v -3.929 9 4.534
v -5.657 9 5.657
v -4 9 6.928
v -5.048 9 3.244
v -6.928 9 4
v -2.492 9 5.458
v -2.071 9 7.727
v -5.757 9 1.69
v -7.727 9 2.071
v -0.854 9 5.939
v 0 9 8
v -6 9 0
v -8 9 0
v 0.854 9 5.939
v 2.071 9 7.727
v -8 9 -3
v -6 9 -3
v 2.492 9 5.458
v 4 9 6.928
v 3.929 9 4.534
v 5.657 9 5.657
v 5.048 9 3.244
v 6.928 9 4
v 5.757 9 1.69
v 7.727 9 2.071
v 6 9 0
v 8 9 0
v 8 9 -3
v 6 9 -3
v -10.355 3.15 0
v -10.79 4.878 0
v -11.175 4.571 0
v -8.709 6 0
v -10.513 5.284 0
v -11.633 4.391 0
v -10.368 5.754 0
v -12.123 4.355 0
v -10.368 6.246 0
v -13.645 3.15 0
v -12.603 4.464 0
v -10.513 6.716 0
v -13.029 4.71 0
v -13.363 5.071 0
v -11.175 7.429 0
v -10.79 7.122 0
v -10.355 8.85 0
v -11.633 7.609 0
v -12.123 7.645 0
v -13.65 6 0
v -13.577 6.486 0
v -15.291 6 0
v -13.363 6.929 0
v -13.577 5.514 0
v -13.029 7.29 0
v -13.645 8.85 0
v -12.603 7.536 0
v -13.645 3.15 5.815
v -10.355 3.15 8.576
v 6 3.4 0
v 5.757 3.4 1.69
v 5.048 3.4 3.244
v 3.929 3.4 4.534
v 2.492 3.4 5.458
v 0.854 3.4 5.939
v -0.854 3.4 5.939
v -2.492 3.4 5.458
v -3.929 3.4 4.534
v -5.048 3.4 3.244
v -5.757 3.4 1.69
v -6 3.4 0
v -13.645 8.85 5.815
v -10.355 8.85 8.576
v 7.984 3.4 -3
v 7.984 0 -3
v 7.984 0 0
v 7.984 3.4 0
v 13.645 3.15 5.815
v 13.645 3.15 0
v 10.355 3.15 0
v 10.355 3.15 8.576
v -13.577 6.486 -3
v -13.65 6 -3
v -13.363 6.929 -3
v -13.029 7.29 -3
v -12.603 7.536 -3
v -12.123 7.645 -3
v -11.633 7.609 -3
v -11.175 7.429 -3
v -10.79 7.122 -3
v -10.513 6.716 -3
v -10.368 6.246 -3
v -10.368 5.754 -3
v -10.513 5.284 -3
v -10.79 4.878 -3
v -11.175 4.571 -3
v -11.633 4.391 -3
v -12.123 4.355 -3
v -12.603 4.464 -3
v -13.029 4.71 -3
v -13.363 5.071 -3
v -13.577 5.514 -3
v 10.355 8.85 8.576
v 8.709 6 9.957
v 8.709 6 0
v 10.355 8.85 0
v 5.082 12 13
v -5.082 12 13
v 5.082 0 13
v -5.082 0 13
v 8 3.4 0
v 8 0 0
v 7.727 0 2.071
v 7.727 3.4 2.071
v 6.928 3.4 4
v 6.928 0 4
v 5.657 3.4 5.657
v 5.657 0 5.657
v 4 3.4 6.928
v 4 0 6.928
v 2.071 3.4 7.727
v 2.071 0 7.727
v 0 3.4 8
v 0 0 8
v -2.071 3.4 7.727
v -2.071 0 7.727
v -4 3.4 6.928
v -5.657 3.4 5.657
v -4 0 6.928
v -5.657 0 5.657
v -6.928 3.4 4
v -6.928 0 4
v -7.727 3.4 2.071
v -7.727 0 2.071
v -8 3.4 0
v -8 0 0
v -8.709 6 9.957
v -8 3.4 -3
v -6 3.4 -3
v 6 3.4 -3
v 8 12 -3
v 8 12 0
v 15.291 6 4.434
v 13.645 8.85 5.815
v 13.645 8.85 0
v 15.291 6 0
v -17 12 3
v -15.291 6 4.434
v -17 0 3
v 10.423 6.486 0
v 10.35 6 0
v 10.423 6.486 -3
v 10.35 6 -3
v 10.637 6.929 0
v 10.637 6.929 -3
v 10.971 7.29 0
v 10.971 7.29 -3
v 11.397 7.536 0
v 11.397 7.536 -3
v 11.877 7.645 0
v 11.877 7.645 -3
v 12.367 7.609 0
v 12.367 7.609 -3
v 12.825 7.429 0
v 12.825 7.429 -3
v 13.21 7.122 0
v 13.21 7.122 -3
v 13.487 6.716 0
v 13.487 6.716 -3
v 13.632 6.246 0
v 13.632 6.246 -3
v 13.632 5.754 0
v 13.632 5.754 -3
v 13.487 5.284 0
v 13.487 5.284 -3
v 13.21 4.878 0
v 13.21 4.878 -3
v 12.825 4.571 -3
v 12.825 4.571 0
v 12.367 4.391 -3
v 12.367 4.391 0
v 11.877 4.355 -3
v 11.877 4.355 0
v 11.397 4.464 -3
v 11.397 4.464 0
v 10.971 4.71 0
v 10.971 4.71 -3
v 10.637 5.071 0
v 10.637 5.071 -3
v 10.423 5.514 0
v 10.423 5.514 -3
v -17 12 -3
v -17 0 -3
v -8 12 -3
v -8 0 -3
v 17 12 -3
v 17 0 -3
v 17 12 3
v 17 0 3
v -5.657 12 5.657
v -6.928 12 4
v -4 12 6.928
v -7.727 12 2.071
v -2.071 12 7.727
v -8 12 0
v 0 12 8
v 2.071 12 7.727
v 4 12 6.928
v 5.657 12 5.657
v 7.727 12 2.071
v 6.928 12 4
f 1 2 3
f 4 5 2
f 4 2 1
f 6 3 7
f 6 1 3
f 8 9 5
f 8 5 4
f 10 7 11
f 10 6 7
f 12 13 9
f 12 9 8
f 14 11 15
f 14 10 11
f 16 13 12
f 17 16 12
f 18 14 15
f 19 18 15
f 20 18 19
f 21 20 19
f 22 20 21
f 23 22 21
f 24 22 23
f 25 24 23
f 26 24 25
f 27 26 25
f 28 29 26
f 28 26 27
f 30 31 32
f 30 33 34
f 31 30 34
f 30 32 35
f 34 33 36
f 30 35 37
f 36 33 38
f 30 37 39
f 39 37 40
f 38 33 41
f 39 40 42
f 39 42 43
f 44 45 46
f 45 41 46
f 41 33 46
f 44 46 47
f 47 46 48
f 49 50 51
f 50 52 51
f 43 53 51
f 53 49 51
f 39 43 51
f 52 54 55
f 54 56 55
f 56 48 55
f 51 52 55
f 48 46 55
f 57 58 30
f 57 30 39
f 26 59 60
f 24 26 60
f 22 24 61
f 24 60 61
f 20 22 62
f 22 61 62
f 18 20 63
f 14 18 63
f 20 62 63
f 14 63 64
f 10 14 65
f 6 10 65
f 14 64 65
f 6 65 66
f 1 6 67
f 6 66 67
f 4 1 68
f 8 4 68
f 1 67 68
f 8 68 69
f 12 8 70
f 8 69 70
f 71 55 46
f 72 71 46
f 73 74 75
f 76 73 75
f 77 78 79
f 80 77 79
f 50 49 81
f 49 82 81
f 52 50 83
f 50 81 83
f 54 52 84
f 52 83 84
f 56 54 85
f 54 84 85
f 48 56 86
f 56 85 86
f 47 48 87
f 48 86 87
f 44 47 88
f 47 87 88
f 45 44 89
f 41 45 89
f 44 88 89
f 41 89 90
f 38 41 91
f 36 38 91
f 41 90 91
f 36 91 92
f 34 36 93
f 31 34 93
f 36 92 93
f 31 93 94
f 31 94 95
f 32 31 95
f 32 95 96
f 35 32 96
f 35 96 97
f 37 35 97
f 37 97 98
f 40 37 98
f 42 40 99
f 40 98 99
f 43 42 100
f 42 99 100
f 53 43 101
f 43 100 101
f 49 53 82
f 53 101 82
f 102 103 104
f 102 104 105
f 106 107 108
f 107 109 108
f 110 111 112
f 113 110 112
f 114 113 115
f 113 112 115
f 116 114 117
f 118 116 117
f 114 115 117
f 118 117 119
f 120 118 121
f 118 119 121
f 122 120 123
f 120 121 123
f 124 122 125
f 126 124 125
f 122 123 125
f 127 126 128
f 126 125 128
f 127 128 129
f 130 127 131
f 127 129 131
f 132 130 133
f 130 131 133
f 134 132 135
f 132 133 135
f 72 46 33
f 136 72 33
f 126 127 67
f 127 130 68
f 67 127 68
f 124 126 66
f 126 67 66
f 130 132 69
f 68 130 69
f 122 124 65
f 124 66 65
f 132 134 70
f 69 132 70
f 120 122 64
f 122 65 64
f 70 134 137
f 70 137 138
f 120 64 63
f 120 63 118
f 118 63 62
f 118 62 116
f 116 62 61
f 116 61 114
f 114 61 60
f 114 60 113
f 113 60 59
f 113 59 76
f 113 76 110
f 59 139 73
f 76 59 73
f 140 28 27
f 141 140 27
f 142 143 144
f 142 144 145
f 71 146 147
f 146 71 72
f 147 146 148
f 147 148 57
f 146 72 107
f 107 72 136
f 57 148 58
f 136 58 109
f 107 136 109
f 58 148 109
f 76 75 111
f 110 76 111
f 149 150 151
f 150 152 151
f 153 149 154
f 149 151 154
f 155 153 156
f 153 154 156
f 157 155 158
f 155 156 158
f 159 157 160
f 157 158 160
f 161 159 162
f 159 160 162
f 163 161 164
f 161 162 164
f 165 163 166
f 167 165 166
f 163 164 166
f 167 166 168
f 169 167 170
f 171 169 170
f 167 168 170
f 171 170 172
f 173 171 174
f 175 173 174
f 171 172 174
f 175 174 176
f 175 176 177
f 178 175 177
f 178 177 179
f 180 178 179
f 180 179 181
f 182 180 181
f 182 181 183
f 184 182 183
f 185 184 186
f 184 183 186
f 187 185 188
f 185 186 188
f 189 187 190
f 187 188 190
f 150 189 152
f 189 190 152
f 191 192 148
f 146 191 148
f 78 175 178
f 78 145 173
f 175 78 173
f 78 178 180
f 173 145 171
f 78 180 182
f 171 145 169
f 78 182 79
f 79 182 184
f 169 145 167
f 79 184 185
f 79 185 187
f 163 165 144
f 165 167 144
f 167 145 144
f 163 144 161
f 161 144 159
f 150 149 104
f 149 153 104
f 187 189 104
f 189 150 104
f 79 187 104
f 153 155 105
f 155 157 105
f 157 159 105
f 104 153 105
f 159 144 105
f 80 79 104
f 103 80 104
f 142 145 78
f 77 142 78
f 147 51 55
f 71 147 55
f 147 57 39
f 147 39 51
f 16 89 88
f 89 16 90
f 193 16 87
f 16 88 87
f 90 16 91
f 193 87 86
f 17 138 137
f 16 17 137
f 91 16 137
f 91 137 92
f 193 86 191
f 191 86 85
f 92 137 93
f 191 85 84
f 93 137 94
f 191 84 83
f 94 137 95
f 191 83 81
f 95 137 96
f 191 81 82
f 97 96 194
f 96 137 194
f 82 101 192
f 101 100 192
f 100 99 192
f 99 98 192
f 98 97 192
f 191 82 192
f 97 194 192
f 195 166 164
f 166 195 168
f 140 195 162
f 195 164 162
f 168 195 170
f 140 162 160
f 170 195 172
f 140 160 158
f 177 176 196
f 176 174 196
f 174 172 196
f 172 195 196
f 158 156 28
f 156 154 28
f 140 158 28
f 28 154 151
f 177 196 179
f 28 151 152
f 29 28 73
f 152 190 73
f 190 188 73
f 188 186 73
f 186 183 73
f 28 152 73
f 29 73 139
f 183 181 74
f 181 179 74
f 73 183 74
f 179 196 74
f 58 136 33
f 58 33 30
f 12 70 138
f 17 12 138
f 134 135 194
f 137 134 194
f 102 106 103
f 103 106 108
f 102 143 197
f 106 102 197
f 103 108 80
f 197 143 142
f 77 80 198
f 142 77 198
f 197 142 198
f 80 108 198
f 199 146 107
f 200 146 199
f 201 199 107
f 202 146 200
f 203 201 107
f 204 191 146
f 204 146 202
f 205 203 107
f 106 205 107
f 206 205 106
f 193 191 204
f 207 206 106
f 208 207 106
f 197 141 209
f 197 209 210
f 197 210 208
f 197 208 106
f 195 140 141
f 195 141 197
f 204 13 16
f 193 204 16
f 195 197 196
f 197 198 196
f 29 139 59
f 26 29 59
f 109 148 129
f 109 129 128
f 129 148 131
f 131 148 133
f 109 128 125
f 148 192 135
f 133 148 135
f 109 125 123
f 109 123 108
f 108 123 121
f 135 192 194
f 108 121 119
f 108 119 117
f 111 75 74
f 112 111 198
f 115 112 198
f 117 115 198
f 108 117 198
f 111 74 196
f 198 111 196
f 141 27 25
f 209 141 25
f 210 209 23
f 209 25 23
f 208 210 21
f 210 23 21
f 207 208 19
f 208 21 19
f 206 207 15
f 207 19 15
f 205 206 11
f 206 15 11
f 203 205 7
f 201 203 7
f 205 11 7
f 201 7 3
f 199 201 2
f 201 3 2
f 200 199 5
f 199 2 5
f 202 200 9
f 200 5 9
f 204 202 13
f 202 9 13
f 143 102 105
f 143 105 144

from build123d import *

# Parameters (mm, degrees)
EXTRUDE_1_DEPTH          = 3.4
EXTRUDE_2_DEPTH          = 5.6
EXTRUDE_3_DEPTH          = 3
SKETCH_5_R               = 1.65
CUT_EXTRUDE_2_DEPTH      = 4
CUT_EXTRUDE_2_DEPTH_BACK = 14
CUT_EXTRUDE_1_REACH      = 15


with BuildPart() as part:
    # 草图1 → 凸台-拉伸1 (new body)
    with BuildSketch(Plane(origin=(0, 0, 0), x_dir=(1, 0, 0), z_dir=(0, 1, 0))):
        with BuildLine():
            Line((-17, -3), (-5.082464074, -13))
            Line((-5.082464074, -13), (5.082464074, -13))
            Line((5.082464074, -13), (17, -3))
            Line((17, -3), (17, 0))
            Line((17, 0), (17, 3))
            Line((17, 3), (7.984491068, 3))
            Line((7.984491068, 3), (7.984491068, 0))
            Line((7.984491068, 0), (8, 0))
            ThreePointArc((8, 0), (0, -8), (-8, 0))
            Line((-8, 0), (-8, 3))
            Line((-8, 3), (-17, 3))
            Line((-17, 3), (-17, -3))
        make_face()
    extrude(amount=EXTRUDE_1_DEPTH)

    # 草图2 → 凸台-拉伸2 (add)
    with BuildSketch(Plane(origin=(0, 3.4, 0), x_dir=(1, 0, 0), z_dir=(0, 1, 0))):
        with BuildLine():
            Line((-17, -3), (-5.082464074, -13))
            Line((-5.082464074, -13), (5.082464074, -13))
            Line((5.082464074, -13), (17, -3))
            Line((17, -3), (17, 3))
            Line((17, 3), (6, 3))
            Line((6, 3), (6, 0))
            ThreePointArc((6, 0), (0, -6), (-6, 0))
            Line((-6, 0), (-6, 3))
            Line((-6, 3), (-17, 3))
            Line((-17, 3), (-17, -3))
        make_face()
    extrude(amount=EXTRUDE_2_DEPTH)

    # 草图3 → 凸台-拉伸3 (add)
    with BuildSketch(Plane(origin=(0, 9, 0), x_dir=(1, 0, 0), z_dir=(0, 1, 0))):
        with BuildLine():
            Line((-17, -3), (-5.082464074, -13))
            Line((-5.082464074, -13), (5.082464074, -13))
            Line((5.082464074, -13), (17, -3))
            Line((17, -3), (17, 3))
            Line((17, 3), (8, 3))
            Line((8, 3), (8, 0))
            ThreePointArc((8, 0), (0, -8), (-8, 0))
            Line((-8, 0), (-8, 3))
            Line((-8, 3), (-17, 3))
            Line((-17, 3), (-17, -3))
        make_face()
    extrude(amount=EXTRUDE_3_DEPTH)

    # 草图5 → 切除-拉伸2 (cut, two sides)
    with BuildSketch(Plane(origin=(0, 0, 0), x_dir=(-1, 0, 0), z_dir=(0, 0, -1))) as cut_extrude_2_sk:
        with Locations((12, 6)):
            Circle(SKETCH_5_R)
        with Locations((-12, 6)):
            Circle(SKETCH_5_R)
    extrude(amount=CUT_EXTRUDE_2_DEPTH, mode=Mode.SUBTRACT)
    extrude(cut_extrude_2_sk.sketch, amount=-CUT_EXTRUDE_2_DEPTH_BACK, mode=Mode.SUBTRACT)

    # 草图4 → 切除-拉伸1 (cut, up to next)
    with BuildSketch(Plane(origin=(0, 0, 0), x_dir=(-1, 0, 0), z_dir=(0, 0, -1)), mode=Mode.PRIVATE) as cut_extrude_1_sk1:
        Polygon((10.354551733, 3.15), (13.645448267, 3.15), (15.290896534, 6), (13.645448267, 8.85), (10.354551733, 8.85), (8.709103466, 6), align=None)
    cut_extrude_1_tool1 = extrude(cut_extrude_1_sk1.sketch, amount=-CUT_EXTRUDE_1_REACH, mode=Mode.PRIVATE) & part.part
    add(cut_extrude_1_tool1.solids().sort_by_distance((-12, 6, 0))[0], mode=Mode.SUBTRACT)
    # 草图4 → 切除-拉伸1 (cut, up to next)
    with BuildSketch(Plane(origin=(0, 0, 0), x_dir=(-1, 0, 0), z_dir=(0, 0, -1)), mode=Mode.PRIVATE) as cut_extrude_1_sk2:
        Polygon((-13.645448267, 3.15), (-10.354551733, 3.15), (-8.709103466, 6), (-10.354551733, 8.85), (-13.645448267, 8.85), (-15.290896534, 6), align=None)
    cut_extrude_1_tool2 = extrude(cut_extrude_1_sk2.sketch, amount=-CUT_EXTRUDE_1_REACH, mode=Mode.PRIVATE) & part.part
    add(cut_extrude_1_tool2.solids().sort_by_distance((12, 6, 0))[0], mode=Mode.SUBTRACT)


solid = part.part
